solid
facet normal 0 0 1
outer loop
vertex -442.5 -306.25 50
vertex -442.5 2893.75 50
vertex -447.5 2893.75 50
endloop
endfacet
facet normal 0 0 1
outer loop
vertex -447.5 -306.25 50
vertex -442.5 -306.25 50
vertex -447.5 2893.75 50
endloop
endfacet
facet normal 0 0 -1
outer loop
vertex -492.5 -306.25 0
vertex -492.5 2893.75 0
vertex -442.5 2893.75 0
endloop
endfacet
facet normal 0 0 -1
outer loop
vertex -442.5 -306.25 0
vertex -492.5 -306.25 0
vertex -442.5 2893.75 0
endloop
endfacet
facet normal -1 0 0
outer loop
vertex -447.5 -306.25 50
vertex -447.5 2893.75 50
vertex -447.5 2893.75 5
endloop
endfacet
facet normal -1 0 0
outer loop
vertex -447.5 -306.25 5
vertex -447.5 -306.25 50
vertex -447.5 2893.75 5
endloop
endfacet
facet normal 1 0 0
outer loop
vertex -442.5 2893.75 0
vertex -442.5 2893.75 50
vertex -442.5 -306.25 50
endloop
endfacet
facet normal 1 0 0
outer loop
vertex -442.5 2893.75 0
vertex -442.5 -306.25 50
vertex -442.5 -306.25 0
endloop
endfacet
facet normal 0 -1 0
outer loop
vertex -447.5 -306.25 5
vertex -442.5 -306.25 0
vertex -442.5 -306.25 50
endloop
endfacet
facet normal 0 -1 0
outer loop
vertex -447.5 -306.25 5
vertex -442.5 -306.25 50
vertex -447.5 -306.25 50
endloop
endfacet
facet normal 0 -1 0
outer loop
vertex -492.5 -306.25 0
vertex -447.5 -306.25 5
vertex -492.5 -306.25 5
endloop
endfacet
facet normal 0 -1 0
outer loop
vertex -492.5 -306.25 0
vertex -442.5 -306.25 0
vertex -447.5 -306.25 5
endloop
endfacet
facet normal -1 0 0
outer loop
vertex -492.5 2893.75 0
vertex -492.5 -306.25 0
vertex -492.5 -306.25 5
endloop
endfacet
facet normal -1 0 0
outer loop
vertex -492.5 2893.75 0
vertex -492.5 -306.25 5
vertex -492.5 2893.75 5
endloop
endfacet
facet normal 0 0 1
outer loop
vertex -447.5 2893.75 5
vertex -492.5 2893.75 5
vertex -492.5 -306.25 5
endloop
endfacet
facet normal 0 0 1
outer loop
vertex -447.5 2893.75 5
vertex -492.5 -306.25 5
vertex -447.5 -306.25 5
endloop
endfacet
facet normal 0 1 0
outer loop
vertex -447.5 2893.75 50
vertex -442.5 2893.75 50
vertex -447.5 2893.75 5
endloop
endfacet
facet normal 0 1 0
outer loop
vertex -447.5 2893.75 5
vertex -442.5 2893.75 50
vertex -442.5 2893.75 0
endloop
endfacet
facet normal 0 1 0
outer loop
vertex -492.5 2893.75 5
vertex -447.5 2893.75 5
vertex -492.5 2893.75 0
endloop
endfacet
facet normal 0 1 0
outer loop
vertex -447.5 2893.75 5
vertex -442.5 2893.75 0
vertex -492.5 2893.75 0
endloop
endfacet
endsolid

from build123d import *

# Parameters (mm, degrees)
SKETCH_1_W      = 45
SKETCH_1_H      = 3200
EXTRUDE_1_DEPTH = 5
EXTRUDE_3_DEPTH = 3200


with BuildPart() as part:
    # Эскиз1 → Бобышка-Вытянуть1 (new body)
    with BuildSketch(Plane.XY):
        with Locations((-470, 1293.75)):
            Rectangle(SKETCH_1_W, SKETCH_1_H)
    extrude(amount=EXTRUDE_1_DEPTH)

    # Эскиз3 → Бобышка-Вытянуть3 (add)
    with BuildSketch(Plane(origin=(0, 2893.75, 0), x_dir=(1, 0, 0), z_dir=(0, 1, 0))):
        Polygon((-447.5, 0), (-442.5, 0), (-442.5, -5), (-442.5, -50), (-447.5, -50), align=None)
    extrude(amount=-EXTRUDE_3_DEPTH)


solid = part.part
